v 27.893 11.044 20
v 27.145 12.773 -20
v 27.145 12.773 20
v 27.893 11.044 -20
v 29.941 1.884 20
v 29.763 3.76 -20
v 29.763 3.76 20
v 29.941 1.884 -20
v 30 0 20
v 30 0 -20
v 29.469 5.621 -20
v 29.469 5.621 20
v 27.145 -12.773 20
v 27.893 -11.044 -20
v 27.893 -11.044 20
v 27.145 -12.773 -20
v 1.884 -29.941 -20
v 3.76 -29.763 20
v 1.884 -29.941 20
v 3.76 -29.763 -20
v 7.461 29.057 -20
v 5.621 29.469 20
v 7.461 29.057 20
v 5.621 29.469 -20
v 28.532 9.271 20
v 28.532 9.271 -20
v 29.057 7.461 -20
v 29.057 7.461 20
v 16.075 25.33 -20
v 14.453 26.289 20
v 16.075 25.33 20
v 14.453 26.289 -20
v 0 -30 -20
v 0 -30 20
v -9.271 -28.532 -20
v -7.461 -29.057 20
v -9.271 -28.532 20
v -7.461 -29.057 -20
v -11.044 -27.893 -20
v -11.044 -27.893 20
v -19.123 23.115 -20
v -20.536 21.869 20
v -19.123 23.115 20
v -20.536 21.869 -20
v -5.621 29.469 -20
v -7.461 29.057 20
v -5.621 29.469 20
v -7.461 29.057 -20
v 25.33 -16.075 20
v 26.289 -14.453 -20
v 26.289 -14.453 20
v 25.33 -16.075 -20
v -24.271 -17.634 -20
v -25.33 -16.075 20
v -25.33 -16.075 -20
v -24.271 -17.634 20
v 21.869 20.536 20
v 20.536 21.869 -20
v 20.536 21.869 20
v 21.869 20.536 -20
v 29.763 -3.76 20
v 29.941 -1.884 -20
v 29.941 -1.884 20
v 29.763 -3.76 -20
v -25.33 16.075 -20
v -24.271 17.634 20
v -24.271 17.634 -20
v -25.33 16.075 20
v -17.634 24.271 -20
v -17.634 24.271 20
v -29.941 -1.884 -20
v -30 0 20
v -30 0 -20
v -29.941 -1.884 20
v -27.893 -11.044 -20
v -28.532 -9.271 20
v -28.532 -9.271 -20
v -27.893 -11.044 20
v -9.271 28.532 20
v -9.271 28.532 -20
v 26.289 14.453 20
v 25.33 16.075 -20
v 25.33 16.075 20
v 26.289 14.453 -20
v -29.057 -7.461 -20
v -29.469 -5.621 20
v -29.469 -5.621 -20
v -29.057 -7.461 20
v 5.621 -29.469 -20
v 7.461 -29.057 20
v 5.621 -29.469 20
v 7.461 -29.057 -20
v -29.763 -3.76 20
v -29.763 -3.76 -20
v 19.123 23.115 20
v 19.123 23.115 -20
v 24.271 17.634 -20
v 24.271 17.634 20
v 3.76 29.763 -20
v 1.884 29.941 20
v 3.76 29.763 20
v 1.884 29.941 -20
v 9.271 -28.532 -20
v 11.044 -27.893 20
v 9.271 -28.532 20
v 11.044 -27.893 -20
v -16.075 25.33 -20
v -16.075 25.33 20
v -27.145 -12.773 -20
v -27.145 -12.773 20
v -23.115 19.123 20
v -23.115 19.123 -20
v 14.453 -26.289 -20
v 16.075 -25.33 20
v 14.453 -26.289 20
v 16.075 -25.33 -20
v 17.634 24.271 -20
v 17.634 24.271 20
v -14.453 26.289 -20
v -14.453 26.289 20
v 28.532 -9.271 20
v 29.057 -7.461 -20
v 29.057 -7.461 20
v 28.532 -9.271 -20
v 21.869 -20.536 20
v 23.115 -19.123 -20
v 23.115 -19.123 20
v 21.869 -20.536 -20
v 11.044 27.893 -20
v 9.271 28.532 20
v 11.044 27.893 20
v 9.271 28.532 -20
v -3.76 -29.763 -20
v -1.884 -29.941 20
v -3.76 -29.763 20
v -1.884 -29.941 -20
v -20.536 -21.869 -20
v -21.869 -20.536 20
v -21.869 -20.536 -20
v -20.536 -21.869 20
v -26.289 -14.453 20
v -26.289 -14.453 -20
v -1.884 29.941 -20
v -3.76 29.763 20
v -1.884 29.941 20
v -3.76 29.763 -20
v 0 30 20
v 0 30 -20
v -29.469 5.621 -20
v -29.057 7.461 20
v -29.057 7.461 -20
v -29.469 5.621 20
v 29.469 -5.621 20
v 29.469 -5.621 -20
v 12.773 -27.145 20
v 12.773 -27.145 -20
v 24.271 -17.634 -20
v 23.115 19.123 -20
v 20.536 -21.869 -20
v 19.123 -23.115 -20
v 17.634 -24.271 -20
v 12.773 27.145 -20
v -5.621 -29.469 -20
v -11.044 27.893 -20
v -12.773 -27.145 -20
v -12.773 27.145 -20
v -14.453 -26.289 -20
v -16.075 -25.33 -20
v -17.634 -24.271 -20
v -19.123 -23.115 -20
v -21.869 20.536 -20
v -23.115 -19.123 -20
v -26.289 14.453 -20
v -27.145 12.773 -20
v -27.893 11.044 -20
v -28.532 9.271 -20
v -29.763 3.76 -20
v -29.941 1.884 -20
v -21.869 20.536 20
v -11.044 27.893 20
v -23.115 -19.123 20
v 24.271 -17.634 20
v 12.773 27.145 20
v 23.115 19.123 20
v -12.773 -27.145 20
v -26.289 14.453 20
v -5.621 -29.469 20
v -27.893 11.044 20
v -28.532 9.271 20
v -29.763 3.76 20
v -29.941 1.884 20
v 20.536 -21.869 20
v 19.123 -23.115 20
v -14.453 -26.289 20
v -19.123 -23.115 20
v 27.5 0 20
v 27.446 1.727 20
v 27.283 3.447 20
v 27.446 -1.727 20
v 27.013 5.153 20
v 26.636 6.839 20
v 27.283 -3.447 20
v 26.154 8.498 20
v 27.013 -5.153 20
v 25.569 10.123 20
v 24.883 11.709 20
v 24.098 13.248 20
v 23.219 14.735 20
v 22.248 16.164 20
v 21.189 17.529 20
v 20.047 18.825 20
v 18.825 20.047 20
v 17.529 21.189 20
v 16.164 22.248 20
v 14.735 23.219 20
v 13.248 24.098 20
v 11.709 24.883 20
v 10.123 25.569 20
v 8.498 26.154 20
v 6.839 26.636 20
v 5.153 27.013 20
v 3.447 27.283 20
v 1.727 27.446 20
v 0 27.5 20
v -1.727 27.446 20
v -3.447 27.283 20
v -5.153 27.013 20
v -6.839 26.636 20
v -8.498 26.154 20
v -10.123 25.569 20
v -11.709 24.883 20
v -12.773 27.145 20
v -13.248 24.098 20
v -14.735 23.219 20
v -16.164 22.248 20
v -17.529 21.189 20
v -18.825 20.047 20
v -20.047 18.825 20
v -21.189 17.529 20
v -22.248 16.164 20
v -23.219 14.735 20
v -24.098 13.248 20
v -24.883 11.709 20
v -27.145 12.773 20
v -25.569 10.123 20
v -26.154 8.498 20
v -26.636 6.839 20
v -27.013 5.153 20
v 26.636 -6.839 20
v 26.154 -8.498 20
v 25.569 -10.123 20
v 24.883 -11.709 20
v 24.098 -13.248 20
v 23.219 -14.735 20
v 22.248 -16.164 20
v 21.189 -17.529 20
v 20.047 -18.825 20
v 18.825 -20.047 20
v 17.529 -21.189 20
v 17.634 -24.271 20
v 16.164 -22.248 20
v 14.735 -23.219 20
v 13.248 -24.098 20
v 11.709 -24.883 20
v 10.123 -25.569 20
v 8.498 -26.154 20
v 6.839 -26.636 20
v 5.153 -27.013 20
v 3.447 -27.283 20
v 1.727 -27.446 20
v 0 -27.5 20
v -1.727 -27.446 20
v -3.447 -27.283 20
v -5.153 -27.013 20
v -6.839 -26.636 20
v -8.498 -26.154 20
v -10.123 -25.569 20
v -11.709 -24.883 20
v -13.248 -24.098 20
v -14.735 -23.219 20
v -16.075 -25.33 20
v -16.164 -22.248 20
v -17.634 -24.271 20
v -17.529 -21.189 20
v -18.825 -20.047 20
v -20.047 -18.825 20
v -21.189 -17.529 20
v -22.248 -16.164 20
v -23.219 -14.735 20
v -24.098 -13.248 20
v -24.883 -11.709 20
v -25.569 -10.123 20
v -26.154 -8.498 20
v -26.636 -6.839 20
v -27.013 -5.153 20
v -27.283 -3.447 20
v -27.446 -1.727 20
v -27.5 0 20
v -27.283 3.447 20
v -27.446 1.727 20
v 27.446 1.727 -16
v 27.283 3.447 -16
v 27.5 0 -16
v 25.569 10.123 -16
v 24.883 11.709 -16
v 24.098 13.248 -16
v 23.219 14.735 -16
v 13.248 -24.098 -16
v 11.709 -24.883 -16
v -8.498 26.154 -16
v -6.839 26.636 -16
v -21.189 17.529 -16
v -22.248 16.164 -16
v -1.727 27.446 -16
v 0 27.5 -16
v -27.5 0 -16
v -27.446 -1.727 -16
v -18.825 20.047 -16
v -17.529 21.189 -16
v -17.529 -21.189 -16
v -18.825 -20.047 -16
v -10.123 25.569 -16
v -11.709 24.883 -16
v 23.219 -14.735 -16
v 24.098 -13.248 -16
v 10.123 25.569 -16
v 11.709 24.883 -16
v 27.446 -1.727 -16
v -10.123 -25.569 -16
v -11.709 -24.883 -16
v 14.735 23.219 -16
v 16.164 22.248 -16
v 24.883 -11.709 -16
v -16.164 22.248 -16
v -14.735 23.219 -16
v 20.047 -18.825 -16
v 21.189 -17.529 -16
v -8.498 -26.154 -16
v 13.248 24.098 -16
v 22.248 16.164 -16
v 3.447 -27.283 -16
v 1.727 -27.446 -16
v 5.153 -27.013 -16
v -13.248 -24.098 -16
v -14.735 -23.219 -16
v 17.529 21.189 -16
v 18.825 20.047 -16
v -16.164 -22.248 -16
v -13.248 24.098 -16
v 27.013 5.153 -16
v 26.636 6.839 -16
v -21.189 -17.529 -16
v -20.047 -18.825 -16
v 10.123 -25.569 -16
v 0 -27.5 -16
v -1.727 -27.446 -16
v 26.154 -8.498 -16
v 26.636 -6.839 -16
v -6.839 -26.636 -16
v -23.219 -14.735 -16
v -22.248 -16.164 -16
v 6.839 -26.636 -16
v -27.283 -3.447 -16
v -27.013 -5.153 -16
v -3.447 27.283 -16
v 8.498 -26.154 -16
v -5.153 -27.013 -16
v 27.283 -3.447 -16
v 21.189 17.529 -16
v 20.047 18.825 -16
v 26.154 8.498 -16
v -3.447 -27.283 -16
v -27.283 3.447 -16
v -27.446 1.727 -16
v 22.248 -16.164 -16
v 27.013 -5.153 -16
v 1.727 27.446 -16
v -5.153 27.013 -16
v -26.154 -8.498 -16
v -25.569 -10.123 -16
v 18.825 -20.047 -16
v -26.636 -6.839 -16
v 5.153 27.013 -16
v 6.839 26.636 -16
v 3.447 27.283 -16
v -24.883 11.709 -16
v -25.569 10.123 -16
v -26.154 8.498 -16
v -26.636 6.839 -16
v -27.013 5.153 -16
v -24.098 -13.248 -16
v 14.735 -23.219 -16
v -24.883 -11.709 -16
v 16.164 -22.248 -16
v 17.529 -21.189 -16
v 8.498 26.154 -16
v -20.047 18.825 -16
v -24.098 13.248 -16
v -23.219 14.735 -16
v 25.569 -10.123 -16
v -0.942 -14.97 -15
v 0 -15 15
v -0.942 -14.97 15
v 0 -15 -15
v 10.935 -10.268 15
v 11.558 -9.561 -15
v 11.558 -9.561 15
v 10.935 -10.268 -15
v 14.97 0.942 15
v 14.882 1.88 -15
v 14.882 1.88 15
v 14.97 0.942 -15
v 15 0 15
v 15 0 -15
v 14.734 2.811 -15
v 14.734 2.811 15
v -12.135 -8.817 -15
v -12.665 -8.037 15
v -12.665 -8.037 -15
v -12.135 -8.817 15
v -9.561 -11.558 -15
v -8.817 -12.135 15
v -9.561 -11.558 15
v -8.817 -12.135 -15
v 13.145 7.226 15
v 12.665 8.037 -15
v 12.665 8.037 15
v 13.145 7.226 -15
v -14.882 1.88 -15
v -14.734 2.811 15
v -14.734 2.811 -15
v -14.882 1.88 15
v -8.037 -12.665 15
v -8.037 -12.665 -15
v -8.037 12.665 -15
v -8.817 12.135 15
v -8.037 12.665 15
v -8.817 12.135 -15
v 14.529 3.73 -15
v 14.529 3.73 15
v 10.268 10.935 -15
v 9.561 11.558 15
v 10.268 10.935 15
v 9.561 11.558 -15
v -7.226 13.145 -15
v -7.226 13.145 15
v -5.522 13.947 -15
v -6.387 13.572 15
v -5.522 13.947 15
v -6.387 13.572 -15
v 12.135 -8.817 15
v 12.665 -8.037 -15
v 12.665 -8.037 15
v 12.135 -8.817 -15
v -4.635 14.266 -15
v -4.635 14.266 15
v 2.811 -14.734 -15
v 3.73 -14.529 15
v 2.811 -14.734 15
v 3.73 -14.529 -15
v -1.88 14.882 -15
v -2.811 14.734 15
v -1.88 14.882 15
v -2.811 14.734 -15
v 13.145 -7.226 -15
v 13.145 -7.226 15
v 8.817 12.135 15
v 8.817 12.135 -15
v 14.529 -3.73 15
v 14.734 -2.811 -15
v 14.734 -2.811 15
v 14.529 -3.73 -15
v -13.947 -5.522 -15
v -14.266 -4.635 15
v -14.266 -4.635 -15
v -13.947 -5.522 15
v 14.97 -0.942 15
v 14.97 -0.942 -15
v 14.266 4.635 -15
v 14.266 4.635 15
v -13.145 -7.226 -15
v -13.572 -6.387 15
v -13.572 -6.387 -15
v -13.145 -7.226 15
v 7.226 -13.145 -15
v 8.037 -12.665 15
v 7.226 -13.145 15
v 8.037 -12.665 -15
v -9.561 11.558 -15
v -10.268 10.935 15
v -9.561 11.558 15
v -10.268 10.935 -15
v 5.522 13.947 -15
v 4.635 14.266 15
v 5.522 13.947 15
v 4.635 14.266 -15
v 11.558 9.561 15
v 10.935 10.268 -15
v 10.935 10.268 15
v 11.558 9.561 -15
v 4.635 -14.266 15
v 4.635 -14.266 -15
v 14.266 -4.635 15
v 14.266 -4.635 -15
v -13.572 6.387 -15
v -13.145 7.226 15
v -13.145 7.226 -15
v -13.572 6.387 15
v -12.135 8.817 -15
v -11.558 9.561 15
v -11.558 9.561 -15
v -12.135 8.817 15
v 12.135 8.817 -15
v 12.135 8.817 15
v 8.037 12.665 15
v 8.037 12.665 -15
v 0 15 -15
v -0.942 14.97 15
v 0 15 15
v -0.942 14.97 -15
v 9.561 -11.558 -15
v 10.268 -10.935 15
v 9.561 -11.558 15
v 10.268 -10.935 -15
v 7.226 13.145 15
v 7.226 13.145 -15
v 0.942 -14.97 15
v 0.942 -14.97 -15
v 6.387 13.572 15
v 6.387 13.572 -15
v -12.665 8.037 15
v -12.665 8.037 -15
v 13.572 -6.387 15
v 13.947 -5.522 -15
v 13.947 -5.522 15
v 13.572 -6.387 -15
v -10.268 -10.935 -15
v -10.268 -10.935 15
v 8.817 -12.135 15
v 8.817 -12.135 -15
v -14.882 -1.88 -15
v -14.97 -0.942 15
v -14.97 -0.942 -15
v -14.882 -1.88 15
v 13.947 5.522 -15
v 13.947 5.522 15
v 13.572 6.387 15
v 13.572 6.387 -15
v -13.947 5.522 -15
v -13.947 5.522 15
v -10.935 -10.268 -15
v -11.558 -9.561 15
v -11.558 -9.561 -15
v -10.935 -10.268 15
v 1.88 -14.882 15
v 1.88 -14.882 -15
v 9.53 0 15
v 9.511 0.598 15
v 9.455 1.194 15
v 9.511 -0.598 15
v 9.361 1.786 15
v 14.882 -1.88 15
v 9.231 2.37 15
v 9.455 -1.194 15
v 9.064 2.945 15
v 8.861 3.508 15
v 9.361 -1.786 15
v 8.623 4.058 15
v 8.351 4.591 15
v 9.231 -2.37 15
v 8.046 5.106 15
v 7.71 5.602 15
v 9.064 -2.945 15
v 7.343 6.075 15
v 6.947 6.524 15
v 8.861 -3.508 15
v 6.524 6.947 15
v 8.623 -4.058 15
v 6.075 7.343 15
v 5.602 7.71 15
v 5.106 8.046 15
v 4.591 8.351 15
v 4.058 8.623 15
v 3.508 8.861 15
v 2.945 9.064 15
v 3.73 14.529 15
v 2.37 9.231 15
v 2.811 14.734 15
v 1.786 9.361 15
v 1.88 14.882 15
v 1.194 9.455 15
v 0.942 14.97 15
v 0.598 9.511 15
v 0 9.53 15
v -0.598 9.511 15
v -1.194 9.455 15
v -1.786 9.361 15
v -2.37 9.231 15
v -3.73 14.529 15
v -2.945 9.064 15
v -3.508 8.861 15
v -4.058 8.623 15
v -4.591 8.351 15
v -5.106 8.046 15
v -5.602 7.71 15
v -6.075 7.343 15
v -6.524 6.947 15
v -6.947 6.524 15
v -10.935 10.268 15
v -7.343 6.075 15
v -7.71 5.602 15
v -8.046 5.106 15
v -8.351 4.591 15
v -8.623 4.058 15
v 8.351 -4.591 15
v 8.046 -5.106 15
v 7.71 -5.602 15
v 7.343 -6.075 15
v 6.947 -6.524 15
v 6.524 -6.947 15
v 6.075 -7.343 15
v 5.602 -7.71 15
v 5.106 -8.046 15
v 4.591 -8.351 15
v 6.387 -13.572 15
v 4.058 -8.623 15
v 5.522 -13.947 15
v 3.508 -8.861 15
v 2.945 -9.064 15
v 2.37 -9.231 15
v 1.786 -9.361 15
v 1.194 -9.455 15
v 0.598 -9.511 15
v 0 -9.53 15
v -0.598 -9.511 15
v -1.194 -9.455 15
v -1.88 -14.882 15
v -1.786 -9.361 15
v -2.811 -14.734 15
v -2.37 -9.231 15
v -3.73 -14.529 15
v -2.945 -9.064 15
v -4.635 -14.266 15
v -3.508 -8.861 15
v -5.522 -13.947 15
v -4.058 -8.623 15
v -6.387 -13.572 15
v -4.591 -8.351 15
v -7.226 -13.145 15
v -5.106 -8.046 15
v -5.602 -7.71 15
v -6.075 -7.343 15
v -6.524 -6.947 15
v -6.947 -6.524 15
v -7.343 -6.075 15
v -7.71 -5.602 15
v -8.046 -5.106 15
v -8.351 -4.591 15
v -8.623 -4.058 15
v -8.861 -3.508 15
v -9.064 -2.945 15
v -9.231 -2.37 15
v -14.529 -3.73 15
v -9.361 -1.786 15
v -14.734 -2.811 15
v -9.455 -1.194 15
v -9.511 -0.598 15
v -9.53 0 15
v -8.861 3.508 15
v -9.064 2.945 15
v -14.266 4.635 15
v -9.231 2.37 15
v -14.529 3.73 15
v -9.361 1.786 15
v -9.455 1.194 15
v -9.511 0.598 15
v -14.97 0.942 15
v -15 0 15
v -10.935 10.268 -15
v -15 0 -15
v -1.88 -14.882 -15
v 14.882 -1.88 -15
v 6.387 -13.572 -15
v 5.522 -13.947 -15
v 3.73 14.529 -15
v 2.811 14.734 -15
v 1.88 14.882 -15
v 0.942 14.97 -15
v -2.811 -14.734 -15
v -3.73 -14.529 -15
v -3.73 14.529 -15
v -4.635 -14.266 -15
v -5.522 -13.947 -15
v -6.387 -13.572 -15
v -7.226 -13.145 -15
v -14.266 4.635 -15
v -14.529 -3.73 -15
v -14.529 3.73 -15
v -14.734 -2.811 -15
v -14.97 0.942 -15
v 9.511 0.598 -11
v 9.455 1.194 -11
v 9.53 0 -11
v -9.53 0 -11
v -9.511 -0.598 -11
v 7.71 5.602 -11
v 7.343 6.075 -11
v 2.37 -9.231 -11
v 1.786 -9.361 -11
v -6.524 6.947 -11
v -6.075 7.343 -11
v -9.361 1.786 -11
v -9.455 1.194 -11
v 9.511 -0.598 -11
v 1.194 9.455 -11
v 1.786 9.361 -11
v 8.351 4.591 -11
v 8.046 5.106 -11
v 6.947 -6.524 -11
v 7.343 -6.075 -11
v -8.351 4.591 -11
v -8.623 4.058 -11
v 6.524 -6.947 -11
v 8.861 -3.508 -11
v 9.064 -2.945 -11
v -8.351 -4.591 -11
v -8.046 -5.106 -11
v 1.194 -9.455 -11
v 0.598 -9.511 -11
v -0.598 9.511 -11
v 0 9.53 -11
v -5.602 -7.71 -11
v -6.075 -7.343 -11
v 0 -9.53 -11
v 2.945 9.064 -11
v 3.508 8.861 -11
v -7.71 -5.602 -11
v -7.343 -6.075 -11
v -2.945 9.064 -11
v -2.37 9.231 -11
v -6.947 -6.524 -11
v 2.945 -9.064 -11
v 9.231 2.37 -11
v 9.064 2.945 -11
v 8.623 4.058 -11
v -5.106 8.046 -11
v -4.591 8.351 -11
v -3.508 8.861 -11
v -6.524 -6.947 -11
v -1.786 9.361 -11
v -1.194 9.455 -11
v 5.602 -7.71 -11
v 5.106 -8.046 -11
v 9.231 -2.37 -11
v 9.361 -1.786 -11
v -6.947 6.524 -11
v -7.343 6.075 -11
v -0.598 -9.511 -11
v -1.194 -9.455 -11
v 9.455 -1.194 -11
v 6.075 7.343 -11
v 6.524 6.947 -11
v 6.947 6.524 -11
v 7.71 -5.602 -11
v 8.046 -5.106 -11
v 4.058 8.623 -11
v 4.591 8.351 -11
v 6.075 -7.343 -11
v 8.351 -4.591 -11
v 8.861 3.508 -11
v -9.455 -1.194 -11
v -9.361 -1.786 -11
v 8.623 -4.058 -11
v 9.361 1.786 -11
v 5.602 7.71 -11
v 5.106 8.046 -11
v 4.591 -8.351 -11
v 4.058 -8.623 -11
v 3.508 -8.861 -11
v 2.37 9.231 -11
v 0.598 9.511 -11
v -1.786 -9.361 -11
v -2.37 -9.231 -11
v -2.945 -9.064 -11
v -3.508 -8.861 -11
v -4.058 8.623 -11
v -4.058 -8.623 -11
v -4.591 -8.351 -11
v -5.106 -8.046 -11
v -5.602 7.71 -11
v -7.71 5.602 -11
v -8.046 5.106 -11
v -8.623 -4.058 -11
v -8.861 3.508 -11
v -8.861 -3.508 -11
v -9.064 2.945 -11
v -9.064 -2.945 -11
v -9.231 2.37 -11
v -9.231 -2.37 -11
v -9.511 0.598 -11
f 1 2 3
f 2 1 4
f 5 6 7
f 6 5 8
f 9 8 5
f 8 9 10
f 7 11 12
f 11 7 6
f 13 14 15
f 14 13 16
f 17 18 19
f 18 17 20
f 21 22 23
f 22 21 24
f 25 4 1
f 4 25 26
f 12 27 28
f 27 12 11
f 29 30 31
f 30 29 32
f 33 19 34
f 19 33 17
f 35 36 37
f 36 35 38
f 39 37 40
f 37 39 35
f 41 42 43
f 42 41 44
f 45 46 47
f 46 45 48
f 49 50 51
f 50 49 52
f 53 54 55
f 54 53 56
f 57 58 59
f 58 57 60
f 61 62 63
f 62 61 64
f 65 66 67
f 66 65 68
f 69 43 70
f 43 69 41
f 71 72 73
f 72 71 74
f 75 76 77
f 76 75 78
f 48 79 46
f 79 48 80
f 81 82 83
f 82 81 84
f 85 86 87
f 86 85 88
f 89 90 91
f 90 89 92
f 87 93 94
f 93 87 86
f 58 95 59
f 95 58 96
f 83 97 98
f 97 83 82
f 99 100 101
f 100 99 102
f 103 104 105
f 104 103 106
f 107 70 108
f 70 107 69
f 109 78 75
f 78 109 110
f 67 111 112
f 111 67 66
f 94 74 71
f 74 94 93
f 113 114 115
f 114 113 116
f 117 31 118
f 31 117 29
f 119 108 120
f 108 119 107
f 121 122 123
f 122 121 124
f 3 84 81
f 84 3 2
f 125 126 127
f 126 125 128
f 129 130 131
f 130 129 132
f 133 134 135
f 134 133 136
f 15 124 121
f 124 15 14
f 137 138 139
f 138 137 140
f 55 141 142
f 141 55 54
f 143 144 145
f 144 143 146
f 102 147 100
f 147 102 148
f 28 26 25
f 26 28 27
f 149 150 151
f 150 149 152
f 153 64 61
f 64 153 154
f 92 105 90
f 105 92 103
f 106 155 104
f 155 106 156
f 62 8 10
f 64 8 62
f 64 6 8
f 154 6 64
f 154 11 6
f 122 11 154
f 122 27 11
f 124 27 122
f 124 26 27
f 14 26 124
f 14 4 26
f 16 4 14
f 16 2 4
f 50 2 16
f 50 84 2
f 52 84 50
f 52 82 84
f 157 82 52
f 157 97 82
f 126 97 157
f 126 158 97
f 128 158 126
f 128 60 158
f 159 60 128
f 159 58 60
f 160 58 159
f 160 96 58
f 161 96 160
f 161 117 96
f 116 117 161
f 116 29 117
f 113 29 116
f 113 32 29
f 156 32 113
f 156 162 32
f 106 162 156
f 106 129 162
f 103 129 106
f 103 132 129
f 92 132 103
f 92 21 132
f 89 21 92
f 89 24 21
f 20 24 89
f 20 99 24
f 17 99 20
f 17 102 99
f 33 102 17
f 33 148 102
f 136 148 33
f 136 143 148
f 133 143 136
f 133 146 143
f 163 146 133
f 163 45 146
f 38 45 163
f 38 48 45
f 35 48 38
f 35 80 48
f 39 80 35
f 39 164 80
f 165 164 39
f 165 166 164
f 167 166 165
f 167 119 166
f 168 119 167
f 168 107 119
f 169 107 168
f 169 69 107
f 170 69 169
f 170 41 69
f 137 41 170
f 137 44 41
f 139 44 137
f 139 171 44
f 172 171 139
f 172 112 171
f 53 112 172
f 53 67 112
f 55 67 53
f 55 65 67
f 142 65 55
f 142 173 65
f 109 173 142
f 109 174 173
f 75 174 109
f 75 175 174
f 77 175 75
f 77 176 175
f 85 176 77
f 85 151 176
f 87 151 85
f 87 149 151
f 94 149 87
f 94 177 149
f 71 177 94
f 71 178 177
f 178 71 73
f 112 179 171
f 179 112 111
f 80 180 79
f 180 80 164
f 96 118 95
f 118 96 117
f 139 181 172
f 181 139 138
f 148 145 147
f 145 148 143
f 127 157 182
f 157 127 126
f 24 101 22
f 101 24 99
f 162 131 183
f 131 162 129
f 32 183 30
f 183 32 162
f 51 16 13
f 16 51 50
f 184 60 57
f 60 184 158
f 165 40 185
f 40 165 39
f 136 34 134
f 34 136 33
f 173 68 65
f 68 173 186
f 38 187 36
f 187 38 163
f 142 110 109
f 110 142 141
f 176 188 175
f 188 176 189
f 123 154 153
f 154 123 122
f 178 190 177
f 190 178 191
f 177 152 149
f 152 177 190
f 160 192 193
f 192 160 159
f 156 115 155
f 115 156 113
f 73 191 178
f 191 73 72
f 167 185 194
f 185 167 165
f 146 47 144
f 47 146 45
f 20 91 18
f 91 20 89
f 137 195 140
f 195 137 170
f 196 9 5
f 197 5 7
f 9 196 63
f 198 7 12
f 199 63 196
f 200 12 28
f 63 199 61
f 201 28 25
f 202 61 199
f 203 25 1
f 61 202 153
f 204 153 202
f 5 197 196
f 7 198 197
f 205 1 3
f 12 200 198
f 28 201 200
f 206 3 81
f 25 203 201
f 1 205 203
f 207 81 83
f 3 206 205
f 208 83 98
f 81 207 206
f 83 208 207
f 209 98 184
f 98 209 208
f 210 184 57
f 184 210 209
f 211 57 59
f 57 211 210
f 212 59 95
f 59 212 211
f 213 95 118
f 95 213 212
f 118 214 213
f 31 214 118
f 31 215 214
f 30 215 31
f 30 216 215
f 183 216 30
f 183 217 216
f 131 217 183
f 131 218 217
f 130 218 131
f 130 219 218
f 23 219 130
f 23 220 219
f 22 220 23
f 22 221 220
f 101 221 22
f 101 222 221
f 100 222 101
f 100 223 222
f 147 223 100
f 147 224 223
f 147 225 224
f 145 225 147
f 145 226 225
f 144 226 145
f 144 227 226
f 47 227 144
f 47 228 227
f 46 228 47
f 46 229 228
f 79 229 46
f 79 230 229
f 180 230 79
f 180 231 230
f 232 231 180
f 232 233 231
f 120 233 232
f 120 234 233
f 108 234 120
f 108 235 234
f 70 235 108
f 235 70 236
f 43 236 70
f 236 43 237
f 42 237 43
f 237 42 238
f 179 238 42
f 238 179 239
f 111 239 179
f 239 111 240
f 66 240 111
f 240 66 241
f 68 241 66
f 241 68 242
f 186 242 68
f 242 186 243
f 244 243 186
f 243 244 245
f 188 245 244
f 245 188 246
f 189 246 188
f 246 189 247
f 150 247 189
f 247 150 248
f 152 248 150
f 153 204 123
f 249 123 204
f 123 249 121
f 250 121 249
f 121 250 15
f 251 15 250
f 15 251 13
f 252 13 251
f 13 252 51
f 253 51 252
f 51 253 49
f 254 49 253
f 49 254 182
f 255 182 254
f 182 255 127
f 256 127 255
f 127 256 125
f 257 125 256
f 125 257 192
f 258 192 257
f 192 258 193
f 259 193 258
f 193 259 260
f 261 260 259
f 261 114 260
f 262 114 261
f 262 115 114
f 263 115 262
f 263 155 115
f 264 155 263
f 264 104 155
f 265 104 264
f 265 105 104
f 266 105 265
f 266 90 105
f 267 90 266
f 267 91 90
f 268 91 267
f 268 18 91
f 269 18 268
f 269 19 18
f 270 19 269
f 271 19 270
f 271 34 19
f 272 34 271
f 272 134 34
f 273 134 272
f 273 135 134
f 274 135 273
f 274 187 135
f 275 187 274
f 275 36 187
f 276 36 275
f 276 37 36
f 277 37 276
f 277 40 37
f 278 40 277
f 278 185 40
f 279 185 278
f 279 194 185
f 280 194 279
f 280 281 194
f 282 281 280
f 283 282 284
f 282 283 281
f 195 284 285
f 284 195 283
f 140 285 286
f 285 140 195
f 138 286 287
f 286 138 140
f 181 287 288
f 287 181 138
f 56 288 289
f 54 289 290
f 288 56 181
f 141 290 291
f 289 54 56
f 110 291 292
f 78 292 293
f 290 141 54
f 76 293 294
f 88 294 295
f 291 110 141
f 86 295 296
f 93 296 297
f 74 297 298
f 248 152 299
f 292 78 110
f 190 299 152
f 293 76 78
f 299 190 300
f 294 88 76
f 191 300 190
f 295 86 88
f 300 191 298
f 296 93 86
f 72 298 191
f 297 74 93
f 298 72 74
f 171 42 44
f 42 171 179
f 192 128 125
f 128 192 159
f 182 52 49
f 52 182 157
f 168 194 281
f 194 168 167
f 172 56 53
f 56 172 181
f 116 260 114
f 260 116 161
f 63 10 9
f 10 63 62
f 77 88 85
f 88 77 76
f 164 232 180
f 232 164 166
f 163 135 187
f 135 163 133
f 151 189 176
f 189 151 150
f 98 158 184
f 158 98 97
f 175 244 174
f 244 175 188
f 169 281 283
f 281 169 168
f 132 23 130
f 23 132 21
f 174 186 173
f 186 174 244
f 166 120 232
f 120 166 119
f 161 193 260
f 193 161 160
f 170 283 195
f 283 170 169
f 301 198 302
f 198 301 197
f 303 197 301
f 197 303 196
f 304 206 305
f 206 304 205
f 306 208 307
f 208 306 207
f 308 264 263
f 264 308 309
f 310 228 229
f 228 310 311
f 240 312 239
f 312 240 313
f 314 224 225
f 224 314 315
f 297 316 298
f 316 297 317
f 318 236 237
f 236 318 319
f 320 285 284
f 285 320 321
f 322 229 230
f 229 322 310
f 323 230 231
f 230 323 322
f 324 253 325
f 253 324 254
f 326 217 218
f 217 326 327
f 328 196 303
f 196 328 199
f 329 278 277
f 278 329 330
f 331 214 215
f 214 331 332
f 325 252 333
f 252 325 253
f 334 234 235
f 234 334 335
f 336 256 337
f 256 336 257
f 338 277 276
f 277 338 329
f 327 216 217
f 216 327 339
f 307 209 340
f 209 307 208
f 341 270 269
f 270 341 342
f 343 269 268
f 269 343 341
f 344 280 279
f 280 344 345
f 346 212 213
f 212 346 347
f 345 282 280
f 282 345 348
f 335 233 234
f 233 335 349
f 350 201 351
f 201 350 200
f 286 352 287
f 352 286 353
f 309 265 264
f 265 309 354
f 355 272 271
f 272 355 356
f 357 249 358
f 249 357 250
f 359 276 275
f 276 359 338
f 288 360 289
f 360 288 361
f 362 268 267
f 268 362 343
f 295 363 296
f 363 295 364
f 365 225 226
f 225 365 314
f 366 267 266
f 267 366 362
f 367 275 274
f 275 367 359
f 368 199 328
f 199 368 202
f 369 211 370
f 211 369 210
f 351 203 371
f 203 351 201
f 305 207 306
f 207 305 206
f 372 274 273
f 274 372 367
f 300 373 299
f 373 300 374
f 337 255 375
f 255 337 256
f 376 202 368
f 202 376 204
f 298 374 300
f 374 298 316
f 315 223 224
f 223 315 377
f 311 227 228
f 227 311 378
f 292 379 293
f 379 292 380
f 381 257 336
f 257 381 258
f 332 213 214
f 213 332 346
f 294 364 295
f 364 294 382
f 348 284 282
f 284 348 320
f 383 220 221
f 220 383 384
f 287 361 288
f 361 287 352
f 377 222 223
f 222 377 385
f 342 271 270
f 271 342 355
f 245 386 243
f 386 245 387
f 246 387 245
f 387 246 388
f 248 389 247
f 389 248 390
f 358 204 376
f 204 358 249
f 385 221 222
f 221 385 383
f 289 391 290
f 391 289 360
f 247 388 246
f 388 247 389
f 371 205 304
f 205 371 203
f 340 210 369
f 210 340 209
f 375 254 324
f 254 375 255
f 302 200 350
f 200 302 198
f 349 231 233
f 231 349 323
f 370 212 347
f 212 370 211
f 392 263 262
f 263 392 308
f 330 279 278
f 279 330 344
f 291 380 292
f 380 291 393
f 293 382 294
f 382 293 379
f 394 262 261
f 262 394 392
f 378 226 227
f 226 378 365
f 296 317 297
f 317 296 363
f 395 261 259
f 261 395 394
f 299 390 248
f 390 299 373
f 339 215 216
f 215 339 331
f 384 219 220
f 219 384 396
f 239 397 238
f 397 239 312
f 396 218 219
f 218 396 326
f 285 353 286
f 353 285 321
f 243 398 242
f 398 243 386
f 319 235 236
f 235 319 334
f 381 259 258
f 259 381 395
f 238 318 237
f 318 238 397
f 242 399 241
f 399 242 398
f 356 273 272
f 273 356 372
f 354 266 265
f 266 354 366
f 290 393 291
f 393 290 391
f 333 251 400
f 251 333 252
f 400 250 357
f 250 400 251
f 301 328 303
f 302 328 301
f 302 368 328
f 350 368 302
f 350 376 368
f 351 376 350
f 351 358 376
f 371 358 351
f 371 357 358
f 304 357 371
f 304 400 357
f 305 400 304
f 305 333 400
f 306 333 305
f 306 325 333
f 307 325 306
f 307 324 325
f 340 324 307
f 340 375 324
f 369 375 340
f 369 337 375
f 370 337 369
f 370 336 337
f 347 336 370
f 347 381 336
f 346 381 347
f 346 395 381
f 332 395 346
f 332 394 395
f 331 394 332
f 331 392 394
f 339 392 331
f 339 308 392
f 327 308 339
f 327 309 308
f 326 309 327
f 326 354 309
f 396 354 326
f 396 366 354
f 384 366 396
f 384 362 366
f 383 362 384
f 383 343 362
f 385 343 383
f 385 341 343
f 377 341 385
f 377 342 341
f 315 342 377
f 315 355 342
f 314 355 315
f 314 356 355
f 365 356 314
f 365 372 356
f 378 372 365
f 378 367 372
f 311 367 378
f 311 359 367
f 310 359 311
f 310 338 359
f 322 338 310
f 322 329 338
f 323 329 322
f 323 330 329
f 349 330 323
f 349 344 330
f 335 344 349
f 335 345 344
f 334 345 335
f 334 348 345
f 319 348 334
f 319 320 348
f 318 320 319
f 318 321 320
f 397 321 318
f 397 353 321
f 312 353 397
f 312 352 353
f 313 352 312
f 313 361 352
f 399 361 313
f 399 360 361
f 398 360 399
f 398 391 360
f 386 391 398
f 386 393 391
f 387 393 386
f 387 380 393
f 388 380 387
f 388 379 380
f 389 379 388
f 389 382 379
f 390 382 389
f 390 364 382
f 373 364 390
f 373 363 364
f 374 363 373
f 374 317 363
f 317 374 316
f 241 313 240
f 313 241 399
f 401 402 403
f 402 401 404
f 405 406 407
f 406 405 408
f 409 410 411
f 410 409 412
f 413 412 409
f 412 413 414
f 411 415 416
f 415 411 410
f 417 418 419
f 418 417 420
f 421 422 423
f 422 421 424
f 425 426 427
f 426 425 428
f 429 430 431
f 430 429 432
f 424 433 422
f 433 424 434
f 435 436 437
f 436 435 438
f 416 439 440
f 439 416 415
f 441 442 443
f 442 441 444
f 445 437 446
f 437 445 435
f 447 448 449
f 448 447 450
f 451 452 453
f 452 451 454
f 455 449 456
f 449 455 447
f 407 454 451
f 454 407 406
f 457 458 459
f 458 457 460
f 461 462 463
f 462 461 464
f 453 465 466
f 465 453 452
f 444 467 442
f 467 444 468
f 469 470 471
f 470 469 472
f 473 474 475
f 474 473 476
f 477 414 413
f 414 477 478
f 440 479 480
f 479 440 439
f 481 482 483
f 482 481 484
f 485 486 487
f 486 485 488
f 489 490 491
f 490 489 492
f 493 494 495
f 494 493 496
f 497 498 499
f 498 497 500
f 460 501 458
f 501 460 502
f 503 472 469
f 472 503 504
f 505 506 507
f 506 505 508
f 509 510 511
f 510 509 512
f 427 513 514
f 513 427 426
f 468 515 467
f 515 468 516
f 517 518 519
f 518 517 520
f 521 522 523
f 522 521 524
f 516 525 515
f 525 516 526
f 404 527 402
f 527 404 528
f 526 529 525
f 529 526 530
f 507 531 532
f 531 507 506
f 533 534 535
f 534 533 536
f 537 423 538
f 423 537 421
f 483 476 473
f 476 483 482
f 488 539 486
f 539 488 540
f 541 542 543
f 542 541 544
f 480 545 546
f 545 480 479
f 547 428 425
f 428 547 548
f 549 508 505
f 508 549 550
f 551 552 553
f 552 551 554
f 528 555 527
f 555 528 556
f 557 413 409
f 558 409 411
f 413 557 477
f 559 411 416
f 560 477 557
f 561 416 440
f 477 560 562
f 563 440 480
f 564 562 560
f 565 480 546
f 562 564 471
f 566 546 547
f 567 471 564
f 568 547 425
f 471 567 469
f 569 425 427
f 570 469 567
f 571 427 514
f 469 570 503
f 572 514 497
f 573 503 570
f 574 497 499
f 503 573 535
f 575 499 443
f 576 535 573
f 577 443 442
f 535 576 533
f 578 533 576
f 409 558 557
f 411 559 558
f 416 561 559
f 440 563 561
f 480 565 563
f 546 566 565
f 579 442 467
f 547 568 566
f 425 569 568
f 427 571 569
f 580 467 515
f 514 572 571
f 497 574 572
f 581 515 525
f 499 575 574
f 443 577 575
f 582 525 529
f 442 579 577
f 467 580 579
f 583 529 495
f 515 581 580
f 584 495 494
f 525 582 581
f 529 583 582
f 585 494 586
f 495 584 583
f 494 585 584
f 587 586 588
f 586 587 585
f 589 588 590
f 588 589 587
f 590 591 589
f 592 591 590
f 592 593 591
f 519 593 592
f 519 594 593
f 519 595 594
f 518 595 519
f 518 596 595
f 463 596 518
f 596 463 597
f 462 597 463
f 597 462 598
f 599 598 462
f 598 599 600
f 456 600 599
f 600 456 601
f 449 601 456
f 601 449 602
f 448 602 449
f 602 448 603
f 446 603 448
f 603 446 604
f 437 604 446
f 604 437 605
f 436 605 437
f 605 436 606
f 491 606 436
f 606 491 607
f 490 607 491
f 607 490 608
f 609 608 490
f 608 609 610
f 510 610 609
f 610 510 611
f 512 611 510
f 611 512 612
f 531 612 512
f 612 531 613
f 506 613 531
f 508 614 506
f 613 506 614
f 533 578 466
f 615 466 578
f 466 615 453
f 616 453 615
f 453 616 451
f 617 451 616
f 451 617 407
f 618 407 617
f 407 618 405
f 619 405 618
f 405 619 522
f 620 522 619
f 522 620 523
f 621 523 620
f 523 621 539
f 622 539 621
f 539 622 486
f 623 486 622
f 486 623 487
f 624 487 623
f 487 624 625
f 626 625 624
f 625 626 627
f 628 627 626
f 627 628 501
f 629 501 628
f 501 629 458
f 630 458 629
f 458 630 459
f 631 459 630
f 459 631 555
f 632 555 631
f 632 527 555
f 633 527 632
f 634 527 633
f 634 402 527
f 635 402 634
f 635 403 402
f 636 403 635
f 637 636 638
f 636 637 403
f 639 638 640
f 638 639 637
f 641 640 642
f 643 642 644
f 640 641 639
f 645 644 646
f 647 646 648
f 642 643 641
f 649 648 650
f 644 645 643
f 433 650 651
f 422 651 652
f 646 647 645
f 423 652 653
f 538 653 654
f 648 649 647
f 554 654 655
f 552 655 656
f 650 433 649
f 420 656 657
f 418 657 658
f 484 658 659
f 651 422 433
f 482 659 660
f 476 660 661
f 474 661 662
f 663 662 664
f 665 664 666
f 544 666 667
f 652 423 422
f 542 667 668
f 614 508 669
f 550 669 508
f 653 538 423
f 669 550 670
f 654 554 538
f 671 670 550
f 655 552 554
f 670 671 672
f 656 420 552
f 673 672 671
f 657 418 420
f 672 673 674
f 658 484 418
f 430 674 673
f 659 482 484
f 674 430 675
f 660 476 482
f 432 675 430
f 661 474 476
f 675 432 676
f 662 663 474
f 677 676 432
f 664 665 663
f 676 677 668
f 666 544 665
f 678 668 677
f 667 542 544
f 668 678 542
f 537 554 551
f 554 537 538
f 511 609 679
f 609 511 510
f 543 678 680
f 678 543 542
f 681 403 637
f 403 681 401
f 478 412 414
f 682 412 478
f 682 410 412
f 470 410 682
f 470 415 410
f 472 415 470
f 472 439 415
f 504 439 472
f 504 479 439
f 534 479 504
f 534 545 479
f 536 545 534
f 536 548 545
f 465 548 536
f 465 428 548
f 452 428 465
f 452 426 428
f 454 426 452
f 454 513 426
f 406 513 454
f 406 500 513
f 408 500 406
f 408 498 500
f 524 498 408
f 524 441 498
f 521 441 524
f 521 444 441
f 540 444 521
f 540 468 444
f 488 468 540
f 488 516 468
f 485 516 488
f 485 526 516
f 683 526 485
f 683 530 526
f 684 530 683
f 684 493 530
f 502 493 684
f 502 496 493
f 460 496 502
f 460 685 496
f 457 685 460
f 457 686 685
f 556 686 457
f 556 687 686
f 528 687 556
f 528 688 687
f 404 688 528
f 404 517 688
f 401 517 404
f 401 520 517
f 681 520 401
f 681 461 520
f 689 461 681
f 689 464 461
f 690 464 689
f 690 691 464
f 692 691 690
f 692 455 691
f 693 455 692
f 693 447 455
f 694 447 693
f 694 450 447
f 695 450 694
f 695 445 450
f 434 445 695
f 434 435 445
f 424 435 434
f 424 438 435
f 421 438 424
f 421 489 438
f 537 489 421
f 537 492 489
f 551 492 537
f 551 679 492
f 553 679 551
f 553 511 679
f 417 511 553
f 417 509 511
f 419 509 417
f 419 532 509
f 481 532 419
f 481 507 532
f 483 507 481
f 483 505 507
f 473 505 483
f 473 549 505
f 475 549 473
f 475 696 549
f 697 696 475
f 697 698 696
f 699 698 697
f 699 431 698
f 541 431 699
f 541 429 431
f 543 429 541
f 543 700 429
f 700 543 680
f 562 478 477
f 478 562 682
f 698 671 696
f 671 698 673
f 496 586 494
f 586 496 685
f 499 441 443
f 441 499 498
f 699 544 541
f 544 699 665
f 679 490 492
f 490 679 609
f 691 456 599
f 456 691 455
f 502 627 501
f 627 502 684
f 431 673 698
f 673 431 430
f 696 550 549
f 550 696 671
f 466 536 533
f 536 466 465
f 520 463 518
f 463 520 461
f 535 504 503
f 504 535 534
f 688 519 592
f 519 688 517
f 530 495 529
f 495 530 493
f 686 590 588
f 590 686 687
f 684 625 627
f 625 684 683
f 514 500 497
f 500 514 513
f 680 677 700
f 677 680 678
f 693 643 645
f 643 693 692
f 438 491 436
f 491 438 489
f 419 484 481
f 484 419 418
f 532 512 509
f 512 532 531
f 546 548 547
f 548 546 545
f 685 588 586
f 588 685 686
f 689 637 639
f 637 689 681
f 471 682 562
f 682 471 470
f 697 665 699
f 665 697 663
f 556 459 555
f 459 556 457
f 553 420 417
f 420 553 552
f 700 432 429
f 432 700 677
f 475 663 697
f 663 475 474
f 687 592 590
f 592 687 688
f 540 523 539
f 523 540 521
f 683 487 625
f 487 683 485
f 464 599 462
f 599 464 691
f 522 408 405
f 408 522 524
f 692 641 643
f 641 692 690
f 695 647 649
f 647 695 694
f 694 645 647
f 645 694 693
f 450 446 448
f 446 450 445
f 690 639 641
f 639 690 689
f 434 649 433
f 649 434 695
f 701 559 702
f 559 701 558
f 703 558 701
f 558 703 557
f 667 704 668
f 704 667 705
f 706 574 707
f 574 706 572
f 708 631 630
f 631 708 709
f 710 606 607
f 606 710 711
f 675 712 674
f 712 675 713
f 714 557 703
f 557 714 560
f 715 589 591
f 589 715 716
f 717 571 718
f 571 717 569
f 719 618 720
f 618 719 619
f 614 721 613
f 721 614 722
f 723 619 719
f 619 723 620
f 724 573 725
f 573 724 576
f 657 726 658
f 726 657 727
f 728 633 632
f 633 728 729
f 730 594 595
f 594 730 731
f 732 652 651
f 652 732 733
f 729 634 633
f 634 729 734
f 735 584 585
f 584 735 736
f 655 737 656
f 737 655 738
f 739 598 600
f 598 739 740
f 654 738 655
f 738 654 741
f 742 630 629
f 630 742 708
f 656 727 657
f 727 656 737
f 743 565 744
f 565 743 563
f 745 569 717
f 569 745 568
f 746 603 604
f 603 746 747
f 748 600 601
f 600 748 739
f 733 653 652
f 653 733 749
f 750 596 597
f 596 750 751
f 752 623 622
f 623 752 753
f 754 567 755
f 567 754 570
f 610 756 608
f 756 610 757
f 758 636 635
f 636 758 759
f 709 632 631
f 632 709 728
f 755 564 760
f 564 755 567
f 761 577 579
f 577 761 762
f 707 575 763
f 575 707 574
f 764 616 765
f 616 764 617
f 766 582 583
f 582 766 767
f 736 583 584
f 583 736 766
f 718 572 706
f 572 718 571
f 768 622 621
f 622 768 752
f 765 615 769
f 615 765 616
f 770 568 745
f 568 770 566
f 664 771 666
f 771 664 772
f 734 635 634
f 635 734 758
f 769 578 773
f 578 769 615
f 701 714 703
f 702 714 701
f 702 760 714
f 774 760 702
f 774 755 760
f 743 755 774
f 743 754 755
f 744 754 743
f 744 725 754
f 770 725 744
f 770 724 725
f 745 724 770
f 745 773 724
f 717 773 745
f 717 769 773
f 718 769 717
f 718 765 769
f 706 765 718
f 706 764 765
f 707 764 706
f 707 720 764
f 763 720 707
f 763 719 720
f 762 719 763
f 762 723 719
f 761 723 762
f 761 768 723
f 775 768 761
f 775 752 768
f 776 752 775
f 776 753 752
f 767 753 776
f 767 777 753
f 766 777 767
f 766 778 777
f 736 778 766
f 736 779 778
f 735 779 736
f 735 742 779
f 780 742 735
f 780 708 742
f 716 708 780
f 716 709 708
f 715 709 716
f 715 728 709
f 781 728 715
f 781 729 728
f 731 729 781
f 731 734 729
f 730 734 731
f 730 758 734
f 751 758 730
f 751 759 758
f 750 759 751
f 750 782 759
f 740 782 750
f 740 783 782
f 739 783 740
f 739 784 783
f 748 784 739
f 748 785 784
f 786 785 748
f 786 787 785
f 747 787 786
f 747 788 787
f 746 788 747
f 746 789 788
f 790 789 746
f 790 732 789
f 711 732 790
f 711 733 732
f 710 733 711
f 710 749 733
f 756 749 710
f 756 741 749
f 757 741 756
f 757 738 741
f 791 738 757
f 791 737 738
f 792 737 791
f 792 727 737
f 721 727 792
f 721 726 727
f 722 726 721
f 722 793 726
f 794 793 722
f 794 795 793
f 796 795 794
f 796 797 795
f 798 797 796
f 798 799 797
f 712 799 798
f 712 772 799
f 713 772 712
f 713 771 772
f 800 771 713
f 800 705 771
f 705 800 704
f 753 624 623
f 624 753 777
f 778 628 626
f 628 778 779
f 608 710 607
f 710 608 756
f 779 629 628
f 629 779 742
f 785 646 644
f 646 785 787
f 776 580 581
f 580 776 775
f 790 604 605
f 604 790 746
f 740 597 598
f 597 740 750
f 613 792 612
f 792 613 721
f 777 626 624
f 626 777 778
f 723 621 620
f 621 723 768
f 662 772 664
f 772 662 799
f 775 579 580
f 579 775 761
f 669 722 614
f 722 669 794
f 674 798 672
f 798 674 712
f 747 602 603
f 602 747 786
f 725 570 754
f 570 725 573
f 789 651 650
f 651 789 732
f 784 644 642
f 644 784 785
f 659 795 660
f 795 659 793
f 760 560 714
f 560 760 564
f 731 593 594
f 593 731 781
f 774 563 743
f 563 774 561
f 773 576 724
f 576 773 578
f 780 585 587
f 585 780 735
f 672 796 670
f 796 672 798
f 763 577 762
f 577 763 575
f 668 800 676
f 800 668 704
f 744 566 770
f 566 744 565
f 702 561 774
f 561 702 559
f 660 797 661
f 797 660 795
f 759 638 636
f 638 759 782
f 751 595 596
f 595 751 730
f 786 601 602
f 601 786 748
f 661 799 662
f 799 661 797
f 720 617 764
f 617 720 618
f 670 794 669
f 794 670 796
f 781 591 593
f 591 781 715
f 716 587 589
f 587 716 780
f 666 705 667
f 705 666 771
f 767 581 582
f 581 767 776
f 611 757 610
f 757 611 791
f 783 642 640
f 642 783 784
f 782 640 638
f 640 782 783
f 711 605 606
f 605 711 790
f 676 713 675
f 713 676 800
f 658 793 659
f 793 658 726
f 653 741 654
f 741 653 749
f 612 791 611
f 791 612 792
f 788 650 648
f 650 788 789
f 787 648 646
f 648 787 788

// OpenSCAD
$fn=100;
bd=60;
bh=40;
ch=30;
cs=19.06;



//candle base
difference(){
    cylinder(bh,d1=bd,d2=bd, center=true);
    translate([0,0,3]) cylinder(bh-2,d1=bd-5,d2=bd-5, center=true);
}

difference()
{
    cylinder(ch,d1=ch,d2=ch, center=true);
    translate([0,0,3]) cylinder(ch-2,d1=cs,d2=cs, center=true);
}
